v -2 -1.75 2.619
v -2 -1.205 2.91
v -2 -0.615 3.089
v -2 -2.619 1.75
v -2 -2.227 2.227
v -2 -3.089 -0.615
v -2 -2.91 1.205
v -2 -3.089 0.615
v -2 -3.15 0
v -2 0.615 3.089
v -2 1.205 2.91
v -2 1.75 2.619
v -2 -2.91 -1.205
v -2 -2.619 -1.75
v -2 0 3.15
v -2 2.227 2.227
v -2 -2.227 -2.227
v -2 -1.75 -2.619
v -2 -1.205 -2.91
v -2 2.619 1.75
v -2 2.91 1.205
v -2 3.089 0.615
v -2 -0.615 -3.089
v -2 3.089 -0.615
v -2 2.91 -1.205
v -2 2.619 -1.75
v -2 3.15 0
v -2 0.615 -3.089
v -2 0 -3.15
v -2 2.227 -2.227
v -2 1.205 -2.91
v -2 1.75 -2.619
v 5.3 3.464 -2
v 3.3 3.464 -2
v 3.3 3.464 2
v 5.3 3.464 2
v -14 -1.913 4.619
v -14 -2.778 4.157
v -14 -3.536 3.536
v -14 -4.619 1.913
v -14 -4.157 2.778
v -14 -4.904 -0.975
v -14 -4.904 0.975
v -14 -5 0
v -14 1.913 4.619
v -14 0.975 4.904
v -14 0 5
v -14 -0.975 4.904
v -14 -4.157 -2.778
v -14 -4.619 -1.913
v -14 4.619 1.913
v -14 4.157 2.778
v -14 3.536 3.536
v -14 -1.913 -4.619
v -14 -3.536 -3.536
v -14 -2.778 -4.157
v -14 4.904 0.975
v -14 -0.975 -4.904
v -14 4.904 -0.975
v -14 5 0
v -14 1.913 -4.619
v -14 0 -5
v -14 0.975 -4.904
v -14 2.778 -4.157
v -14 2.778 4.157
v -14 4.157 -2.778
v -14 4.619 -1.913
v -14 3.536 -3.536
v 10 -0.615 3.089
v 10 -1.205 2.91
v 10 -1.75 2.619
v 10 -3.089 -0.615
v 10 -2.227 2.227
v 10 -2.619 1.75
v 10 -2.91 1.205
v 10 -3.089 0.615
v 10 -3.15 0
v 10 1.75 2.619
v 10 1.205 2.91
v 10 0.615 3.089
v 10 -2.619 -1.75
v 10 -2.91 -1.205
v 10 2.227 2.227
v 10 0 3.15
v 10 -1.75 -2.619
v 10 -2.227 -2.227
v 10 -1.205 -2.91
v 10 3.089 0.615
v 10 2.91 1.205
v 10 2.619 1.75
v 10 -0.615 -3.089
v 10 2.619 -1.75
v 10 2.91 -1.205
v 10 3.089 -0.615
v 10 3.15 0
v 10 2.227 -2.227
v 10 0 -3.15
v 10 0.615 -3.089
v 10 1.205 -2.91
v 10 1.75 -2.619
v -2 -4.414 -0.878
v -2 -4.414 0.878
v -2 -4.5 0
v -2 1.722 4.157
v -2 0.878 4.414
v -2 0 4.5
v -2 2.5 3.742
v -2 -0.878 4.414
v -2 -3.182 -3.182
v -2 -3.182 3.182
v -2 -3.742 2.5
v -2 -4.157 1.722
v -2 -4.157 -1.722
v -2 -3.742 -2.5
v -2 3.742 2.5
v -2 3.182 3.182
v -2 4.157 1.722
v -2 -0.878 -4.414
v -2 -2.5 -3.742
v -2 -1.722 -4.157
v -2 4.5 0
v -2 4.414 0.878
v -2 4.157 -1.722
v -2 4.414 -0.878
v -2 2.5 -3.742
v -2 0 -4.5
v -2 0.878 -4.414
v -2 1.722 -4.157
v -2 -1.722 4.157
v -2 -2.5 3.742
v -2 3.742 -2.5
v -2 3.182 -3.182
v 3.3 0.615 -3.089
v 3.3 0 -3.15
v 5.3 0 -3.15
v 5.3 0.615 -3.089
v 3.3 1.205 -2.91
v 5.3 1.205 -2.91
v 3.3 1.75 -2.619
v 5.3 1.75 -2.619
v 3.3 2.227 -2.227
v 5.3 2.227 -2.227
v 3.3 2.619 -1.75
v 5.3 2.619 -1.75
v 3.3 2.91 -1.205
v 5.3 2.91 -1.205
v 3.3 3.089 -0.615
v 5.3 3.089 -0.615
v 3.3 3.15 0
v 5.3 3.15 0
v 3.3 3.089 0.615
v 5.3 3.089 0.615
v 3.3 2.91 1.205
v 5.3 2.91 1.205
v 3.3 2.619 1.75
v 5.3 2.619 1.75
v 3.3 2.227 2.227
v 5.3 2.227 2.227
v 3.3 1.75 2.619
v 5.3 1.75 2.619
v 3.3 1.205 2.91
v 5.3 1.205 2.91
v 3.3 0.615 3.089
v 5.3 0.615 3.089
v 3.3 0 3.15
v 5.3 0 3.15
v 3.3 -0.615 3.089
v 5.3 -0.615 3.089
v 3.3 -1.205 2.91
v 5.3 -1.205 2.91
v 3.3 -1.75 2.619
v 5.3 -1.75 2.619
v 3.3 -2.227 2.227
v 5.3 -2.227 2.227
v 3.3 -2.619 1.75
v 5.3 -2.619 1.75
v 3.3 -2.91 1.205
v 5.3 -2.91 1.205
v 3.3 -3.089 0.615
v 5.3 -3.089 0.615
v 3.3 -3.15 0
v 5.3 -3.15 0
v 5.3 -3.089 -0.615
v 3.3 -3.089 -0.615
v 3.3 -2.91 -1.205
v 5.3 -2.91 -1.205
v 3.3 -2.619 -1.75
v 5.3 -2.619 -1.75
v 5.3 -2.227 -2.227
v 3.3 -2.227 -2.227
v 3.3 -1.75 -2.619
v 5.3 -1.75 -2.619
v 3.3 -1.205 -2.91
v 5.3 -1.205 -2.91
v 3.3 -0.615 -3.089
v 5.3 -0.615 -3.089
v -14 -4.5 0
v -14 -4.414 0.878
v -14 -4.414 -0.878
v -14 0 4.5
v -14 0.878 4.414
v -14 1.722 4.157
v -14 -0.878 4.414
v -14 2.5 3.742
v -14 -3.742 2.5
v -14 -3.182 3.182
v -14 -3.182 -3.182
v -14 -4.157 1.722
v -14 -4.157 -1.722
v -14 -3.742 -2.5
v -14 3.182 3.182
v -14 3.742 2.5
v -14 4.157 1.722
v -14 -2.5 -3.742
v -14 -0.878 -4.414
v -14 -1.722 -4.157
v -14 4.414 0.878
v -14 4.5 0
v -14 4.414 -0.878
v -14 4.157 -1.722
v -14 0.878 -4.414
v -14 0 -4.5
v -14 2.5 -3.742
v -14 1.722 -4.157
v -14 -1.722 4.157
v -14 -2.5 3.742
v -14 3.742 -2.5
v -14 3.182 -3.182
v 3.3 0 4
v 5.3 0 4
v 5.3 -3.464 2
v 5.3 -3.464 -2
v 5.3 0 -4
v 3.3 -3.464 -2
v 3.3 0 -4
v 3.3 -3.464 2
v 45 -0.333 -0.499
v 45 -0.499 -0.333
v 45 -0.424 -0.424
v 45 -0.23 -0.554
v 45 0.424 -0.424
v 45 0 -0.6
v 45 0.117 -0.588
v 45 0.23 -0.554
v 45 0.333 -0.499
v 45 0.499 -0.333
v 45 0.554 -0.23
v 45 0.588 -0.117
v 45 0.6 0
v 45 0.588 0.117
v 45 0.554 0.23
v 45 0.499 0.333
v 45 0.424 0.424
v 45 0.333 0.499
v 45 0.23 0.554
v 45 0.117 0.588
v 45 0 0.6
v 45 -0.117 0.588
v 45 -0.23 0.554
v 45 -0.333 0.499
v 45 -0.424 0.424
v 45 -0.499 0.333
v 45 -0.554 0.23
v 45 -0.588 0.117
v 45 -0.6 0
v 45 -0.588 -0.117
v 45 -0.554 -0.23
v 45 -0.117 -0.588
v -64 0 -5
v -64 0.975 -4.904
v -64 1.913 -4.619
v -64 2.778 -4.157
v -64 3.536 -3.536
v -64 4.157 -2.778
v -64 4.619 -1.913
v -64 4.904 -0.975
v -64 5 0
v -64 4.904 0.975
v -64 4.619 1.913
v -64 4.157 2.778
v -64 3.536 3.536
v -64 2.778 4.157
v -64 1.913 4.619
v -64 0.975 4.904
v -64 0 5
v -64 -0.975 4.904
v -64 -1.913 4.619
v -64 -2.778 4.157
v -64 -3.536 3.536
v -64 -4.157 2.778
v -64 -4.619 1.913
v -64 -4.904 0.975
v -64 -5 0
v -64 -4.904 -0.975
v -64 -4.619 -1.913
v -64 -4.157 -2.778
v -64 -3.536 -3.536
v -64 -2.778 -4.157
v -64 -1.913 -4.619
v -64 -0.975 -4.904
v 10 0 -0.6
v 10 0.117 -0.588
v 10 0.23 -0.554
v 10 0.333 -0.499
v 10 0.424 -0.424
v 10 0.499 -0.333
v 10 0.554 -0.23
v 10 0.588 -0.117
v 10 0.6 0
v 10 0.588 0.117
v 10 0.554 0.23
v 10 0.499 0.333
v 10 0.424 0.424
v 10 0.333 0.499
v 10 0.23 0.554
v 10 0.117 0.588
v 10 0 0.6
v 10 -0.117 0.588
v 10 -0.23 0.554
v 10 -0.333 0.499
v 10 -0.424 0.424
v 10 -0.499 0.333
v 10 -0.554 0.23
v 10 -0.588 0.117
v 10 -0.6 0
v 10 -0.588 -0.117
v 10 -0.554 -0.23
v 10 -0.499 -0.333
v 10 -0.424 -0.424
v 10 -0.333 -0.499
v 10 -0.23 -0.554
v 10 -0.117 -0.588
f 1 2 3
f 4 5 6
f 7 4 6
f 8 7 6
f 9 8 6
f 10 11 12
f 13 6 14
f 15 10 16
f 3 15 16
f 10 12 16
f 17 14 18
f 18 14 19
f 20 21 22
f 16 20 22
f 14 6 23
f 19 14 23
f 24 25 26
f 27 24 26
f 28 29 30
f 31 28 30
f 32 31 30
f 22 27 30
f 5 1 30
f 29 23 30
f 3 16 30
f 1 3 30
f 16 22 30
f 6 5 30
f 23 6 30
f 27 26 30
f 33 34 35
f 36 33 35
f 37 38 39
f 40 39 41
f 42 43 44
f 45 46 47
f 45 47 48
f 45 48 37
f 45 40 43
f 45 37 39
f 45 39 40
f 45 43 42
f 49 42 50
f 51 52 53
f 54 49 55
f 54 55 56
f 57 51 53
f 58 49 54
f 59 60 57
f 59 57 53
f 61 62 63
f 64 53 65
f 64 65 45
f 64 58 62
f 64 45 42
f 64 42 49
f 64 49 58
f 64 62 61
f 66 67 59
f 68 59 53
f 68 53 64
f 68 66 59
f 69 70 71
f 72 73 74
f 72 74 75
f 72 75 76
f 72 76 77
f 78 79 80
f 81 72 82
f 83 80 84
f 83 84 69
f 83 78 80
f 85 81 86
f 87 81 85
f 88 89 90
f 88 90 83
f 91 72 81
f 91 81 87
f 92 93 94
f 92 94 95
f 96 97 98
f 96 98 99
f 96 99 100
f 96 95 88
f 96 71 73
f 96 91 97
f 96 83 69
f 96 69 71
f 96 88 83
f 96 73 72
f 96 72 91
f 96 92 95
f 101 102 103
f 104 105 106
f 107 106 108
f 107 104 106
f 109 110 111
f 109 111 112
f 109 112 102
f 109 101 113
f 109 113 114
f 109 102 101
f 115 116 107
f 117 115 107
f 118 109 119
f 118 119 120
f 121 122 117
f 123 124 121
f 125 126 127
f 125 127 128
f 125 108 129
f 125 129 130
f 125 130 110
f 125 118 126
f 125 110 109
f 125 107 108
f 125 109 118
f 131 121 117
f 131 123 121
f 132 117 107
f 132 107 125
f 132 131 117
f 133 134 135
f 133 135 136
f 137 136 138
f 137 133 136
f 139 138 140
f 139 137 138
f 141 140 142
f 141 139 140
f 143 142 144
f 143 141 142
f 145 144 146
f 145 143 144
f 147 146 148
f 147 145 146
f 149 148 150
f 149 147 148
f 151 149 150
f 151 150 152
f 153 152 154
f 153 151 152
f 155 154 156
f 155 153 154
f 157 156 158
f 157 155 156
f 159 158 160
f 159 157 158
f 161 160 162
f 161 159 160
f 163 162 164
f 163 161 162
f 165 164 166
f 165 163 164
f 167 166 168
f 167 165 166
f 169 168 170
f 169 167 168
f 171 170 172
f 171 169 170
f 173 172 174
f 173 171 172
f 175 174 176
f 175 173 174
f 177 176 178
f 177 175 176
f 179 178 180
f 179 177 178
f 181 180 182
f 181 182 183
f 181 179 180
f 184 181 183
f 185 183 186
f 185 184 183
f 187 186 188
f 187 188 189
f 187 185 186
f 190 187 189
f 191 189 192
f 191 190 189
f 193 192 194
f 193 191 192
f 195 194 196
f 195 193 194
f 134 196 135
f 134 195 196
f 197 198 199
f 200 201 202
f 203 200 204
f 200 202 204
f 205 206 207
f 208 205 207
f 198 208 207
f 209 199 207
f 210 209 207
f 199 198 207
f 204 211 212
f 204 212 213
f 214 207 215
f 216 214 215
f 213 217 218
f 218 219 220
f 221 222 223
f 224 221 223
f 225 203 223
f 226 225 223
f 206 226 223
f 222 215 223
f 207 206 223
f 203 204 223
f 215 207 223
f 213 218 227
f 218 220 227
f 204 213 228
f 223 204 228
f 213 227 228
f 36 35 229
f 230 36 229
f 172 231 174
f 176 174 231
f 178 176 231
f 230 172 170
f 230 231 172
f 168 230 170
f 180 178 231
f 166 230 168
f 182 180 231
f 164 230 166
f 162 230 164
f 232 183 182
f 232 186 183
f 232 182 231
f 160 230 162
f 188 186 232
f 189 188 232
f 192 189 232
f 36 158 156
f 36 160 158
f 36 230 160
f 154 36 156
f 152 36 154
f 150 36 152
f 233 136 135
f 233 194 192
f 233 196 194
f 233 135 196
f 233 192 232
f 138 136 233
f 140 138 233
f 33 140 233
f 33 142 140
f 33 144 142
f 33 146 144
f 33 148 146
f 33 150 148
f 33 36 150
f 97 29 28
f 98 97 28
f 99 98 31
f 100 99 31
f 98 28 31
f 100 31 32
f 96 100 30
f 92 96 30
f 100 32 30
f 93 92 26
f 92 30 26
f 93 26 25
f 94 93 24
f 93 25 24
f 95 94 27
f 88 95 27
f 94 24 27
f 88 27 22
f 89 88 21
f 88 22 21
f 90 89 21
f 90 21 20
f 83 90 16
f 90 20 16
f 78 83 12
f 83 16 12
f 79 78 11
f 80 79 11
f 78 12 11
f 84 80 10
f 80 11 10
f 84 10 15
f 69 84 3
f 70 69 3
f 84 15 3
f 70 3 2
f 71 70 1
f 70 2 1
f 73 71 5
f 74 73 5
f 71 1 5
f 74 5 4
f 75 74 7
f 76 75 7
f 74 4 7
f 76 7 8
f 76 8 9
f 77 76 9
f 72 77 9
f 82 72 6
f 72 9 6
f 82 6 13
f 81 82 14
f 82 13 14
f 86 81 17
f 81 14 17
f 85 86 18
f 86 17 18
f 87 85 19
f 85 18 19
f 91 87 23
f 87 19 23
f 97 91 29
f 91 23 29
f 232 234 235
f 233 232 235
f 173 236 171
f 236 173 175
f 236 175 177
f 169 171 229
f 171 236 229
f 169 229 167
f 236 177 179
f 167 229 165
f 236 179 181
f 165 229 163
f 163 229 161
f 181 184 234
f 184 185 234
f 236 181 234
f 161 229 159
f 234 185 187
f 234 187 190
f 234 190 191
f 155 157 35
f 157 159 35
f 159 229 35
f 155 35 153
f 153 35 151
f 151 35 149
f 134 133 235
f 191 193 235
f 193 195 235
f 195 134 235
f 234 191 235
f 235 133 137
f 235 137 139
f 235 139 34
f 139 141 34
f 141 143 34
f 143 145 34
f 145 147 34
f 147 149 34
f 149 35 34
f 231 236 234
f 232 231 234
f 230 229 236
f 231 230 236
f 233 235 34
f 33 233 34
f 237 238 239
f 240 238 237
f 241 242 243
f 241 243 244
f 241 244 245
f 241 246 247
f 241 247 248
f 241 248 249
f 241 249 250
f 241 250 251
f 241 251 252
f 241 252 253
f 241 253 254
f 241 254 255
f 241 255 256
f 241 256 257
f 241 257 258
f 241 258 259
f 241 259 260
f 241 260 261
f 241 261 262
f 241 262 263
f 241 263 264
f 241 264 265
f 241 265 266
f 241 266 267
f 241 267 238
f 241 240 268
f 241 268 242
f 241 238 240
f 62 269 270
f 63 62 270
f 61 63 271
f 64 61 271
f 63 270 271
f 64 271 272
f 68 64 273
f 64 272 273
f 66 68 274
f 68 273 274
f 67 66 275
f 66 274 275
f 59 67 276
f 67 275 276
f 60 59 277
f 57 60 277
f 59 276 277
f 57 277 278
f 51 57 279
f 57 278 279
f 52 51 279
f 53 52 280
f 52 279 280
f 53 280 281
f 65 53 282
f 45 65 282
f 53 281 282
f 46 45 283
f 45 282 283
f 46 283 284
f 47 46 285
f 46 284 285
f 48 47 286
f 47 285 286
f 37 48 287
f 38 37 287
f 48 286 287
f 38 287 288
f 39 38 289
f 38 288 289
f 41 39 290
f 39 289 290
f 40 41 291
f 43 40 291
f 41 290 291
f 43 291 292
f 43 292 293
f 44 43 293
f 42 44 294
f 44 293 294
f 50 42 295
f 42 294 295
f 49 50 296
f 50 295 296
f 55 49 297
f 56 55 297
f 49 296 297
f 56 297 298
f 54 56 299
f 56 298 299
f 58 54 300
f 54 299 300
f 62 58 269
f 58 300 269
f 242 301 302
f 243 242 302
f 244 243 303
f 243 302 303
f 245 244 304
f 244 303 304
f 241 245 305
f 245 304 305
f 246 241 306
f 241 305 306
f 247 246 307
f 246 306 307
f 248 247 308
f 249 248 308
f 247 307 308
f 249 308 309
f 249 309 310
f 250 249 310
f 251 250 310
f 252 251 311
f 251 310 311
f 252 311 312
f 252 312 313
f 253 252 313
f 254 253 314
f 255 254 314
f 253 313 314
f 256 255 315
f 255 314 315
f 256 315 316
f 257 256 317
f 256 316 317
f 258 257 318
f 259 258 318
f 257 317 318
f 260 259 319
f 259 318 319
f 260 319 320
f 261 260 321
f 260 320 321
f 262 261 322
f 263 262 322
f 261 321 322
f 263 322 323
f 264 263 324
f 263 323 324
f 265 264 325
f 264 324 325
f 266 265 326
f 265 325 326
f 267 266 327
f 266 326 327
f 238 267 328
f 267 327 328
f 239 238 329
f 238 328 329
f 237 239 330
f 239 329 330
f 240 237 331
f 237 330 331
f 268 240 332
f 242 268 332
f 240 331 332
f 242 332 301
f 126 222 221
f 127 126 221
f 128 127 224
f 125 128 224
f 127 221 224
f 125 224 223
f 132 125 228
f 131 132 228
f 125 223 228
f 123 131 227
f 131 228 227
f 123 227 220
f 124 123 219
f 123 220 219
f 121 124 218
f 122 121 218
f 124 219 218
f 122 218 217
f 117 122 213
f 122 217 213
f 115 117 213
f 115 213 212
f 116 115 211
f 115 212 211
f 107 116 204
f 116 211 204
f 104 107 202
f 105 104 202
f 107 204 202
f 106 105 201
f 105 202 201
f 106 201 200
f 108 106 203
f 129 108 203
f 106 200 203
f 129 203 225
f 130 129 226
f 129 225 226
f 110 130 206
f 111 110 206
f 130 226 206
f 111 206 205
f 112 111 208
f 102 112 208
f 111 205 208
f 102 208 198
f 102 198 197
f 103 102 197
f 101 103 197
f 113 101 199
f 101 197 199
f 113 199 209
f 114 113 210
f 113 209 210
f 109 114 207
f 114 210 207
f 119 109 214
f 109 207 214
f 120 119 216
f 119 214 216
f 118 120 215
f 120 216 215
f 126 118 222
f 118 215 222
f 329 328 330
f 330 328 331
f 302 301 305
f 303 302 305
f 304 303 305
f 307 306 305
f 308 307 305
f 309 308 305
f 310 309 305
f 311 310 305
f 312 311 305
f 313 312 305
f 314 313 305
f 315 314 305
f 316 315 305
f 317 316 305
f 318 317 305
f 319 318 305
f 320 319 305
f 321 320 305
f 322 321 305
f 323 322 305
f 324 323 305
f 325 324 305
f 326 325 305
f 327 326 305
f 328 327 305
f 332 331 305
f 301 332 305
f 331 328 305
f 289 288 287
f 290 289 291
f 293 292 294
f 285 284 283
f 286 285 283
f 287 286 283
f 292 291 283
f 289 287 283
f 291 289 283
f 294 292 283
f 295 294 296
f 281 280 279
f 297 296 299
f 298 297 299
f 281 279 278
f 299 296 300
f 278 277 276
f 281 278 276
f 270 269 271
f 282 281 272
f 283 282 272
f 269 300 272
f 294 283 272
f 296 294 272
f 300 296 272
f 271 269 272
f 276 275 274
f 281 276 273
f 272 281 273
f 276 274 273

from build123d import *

# Parameters (mm, degrees)
SMA_START          = -2
SK_SMA_BODY_R      = 3.15
SMA_BODY_DEPTH     = 12
SMA_START_2        = 3.3
SK_SMA_NUT_R       = 3.15
SMA_NUT_DEPTH      = 2
ANTENNA_START      = -14
SK_ANTENNA_BASE_R  = 4.5
ANTENNA_BASE_DEPTH = 12
ANTENNA_START_2    = -64
SK_ANTENNA_R       = 5
ANTENNA_DEPTH      = 50
UFL_START          = 10
SK_UFL_PIGTAIL_R   = 0.6
UFL_PIGTAIL_DEPTH  = 35


with BuildPart() as part:
    # SK SMA body → SMA body (new body)
    with BuildSketch(Plane(origin=(0, 0, 0), x_dir=(0, 0, -1), z_dir=(1, 0, 0)).offset(SMA_START)):
        Circle(SK_SMA_BODY_R)
    extrude(amount=SMA_BODY_DEPTH)


with BuildPart() as body_2:
    # SK SMA nut → SMA nut (new body)
    with BuildSketch(Plane(origin=(0, 0, 0), x_dir=(0, 0, -1), z_dir=(1, 0, 0)).offset(SMA_START_2)):
        Polygon((4, 0), (2, 3.464101615), (-2, 3.464101615), (-4, 0), (-2, -3.464101615), (2, -3.464101615), align=None)
        Circle(SK_SMA_NUT_R, mode=Mode.SUBTRACT)
    extrude(amount=SMA_NUT_DEPTH)


with BuildPart() as body_3:
    # SK Antenna base → Antenna base (new body)
    with BuildSketch(Plane(origin=(0, 0, 0), x_dir=(0, 0, -1), z_dir=(1, 0, 0)).offset(ANTENNA_START)):
        Circle(SK_ANTENNA_BASE_R)
    extrude(amount=ANTENNA_BASE_DEPTH)


with BuildPart() as body_4:
    # SK Antenna → Antenna (new body)
    with BuildSketch(Plane(origin=(0, 0, 0), x_dir=(0, 0, -1), z_dir=(1, 0, 0)).offset(ANTENNA_START_2)):
        Circle(SK_ANTENNA_R)
    extrude(amount=ANTENNA_DEPTH)


with BuildPart() as body_5:
    # SK uFL pigtail → uFL pigtail (new body)
    with BuildSketch(Plane(origin=(0, 0, 0), x_dir=(0, 0, -1), z_dir=(1, 0, 0)).offset(UFL_START)):
        Circle(SK_UFL_PIGTAIL_R)
    extrude(amount=UFL_PIGTAIL_DEPTH)


solid = Compound([part.part, body_2.part, body_3.part, body_4.part, body_5.part])
